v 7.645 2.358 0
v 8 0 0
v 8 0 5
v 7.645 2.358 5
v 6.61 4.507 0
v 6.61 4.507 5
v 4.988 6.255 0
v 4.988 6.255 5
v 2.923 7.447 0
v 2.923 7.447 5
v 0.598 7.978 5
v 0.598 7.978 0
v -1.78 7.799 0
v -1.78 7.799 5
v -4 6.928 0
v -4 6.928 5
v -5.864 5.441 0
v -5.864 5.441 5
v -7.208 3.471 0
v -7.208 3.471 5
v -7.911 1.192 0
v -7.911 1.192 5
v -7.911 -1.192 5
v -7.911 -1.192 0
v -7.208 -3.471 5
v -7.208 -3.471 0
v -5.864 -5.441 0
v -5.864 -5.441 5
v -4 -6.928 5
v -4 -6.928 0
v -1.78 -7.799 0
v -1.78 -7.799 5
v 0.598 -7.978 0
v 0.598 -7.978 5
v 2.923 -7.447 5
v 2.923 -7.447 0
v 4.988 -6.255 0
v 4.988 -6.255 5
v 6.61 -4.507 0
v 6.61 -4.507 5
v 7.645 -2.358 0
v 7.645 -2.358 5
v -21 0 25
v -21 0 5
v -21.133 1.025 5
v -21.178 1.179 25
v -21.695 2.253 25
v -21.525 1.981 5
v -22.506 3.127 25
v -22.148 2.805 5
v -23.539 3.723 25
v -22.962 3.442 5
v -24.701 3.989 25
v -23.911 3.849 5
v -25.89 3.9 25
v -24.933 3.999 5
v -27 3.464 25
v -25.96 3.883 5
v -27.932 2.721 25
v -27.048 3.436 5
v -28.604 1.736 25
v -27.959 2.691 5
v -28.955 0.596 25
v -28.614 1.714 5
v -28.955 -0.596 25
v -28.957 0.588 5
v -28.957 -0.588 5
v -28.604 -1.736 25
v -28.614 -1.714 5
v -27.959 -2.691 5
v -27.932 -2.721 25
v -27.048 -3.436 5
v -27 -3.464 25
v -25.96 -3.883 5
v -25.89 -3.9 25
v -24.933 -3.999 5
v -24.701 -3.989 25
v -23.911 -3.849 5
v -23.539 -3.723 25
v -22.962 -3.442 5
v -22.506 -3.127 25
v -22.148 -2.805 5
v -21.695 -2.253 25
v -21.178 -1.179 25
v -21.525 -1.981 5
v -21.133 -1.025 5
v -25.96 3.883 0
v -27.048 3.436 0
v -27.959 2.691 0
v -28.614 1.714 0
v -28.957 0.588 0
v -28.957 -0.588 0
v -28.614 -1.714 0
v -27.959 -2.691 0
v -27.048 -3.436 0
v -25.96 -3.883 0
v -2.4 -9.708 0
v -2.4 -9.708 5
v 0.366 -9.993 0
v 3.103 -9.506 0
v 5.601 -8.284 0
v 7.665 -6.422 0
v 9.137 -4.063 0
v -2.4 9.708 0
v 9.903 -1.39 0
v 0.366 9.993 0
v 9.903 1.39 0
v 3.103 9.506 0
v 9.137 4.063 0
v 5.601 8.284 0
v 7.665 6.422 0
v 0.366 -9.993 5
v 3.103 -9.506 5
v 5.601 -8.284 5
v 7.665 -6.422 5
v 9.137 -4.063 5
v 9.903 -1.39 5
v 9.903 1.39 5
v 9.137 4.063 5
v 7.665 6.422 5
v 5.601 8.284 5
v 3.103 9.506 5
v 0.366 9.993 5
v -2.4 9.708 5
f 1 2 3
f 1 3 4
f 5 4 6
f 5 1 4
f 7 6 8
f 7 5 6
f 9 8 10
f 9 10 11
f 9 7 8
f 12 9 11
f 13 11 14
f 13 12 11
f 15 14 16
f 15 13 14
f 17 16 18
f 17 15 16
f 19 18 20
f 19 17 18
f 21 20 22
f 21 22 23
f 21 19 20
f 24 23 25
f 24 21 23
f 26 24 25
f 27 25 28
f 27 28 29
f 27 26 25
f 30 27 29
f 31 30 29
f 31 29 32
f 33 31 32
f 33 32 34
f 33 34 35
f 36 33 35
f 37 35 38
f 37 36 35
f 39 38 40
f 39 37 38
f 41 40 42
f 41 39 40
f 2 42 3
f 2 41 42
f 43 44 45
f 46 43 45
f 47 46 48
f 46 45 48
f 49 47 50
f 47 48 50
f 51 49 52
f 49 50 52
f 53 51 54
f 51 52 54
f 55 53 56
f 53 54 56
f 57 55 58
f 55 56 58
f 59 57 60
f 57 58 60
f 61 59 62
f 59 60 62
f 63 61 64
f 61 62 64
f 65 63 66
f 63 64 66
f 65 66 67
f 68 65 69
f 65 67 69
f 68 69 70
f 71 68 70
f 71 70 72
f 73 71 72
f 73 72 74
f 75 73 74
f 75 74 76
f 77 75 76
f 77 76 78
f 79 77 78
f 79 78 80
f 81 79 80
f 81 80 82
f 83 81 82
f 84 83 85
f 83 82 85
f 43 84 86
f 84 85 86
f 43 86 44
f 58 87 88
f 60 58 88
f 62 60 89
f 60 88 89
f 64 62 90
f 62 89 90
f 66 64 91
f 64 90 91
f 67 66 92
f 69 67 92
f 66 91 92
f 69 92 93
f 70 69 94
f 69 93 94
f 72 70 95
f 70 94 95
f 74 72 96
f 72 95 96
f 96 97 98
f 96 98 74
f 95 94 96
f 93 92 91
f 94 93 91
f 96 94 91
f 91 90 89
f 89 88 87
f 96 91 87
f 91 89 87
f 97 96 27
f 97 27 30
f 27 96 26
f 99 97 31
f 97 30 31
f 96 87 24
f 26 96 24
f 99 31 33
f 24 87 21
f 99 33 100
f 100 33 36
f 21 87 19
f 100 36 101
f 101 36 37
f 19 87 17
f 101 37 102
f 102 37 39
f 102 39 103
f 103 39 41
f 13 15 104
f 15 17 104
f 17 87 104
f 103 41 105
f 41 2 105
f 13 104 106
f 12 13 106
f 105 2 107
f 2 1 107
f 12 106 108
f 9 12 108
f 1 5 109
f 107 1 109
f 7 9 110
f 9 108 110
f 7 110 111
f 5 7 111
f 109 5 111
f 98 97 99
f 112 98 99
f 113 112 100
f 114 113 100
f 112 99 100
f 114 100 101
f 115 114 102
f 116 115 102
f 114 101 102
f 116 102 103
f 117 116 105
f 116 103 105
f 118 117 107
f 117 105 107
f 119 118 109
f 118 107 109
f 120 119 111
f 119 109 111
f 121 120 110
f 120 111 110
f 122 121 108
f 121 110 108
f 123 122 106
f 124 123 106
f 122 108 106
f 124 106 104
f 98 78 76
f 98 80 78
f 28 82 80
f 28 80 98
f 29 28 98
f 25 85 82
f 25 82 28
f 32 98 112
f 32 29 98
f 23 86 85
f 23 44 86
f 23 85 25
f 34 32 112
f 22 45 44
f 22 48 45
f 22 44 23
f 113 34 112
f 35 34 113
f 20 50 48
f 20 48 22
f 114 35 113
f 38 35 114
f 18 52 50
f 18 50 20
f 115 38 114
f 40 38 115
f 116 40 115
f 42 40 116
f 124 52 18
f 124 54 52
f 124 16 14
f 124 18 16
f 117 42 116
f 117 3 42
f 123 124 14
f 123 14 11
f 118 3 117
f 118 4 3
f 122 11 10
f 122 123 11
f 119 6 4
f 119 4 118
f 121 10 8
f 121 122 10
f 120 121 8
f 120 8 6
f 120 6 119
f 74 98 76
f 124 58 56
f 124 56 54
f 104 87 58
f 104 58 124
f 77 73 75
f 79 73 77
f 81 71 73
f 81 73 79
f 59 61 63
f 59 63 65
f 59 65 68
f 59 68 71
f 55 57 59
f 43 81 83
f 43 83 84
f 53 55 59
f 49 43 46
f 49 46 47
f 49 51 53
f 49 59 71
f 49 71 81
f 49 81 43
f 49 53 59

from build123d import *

# Parameters (mm, degrees)
SKETCH_R     = 8
PAD_DEPTH    = 5
SKETCH001_R  = 4
PAD001_DEPTH = 20


with BuildPart() as part:
    # Sketch → Pad (new body)
    with BuildSketch(Plane.XY):
        with BuildLine():
            ThreePointArc((-2.4, -9.7077288796), (10, 0), (-2.4, 9.7077288796))
            Line((-25.96, 3.8830915518), (-2.4, 9.7077288796))
            ThreePointArc((-25.96, 3.8830915518), (-29, 0), (-25.96, -3.8830915518))
            Line((-2.4, -9.7077288796), (-25.96, -3.8830915518))
        make_face()
        Circle(SKETCH_R, mode=Mode.SUBTRACT)
    extrude(amount=PAD_DEPTH)

    # Sketch001 (on Face7 of Pad) → Pad001 (join)
    with BuildSketch(Plane.XY.offset(5)):
        with Locations((-25, 0)):
            Circle(SKETCH001_R)
    extrude(amount=PAD001_DEPTH)


solid = part.part
